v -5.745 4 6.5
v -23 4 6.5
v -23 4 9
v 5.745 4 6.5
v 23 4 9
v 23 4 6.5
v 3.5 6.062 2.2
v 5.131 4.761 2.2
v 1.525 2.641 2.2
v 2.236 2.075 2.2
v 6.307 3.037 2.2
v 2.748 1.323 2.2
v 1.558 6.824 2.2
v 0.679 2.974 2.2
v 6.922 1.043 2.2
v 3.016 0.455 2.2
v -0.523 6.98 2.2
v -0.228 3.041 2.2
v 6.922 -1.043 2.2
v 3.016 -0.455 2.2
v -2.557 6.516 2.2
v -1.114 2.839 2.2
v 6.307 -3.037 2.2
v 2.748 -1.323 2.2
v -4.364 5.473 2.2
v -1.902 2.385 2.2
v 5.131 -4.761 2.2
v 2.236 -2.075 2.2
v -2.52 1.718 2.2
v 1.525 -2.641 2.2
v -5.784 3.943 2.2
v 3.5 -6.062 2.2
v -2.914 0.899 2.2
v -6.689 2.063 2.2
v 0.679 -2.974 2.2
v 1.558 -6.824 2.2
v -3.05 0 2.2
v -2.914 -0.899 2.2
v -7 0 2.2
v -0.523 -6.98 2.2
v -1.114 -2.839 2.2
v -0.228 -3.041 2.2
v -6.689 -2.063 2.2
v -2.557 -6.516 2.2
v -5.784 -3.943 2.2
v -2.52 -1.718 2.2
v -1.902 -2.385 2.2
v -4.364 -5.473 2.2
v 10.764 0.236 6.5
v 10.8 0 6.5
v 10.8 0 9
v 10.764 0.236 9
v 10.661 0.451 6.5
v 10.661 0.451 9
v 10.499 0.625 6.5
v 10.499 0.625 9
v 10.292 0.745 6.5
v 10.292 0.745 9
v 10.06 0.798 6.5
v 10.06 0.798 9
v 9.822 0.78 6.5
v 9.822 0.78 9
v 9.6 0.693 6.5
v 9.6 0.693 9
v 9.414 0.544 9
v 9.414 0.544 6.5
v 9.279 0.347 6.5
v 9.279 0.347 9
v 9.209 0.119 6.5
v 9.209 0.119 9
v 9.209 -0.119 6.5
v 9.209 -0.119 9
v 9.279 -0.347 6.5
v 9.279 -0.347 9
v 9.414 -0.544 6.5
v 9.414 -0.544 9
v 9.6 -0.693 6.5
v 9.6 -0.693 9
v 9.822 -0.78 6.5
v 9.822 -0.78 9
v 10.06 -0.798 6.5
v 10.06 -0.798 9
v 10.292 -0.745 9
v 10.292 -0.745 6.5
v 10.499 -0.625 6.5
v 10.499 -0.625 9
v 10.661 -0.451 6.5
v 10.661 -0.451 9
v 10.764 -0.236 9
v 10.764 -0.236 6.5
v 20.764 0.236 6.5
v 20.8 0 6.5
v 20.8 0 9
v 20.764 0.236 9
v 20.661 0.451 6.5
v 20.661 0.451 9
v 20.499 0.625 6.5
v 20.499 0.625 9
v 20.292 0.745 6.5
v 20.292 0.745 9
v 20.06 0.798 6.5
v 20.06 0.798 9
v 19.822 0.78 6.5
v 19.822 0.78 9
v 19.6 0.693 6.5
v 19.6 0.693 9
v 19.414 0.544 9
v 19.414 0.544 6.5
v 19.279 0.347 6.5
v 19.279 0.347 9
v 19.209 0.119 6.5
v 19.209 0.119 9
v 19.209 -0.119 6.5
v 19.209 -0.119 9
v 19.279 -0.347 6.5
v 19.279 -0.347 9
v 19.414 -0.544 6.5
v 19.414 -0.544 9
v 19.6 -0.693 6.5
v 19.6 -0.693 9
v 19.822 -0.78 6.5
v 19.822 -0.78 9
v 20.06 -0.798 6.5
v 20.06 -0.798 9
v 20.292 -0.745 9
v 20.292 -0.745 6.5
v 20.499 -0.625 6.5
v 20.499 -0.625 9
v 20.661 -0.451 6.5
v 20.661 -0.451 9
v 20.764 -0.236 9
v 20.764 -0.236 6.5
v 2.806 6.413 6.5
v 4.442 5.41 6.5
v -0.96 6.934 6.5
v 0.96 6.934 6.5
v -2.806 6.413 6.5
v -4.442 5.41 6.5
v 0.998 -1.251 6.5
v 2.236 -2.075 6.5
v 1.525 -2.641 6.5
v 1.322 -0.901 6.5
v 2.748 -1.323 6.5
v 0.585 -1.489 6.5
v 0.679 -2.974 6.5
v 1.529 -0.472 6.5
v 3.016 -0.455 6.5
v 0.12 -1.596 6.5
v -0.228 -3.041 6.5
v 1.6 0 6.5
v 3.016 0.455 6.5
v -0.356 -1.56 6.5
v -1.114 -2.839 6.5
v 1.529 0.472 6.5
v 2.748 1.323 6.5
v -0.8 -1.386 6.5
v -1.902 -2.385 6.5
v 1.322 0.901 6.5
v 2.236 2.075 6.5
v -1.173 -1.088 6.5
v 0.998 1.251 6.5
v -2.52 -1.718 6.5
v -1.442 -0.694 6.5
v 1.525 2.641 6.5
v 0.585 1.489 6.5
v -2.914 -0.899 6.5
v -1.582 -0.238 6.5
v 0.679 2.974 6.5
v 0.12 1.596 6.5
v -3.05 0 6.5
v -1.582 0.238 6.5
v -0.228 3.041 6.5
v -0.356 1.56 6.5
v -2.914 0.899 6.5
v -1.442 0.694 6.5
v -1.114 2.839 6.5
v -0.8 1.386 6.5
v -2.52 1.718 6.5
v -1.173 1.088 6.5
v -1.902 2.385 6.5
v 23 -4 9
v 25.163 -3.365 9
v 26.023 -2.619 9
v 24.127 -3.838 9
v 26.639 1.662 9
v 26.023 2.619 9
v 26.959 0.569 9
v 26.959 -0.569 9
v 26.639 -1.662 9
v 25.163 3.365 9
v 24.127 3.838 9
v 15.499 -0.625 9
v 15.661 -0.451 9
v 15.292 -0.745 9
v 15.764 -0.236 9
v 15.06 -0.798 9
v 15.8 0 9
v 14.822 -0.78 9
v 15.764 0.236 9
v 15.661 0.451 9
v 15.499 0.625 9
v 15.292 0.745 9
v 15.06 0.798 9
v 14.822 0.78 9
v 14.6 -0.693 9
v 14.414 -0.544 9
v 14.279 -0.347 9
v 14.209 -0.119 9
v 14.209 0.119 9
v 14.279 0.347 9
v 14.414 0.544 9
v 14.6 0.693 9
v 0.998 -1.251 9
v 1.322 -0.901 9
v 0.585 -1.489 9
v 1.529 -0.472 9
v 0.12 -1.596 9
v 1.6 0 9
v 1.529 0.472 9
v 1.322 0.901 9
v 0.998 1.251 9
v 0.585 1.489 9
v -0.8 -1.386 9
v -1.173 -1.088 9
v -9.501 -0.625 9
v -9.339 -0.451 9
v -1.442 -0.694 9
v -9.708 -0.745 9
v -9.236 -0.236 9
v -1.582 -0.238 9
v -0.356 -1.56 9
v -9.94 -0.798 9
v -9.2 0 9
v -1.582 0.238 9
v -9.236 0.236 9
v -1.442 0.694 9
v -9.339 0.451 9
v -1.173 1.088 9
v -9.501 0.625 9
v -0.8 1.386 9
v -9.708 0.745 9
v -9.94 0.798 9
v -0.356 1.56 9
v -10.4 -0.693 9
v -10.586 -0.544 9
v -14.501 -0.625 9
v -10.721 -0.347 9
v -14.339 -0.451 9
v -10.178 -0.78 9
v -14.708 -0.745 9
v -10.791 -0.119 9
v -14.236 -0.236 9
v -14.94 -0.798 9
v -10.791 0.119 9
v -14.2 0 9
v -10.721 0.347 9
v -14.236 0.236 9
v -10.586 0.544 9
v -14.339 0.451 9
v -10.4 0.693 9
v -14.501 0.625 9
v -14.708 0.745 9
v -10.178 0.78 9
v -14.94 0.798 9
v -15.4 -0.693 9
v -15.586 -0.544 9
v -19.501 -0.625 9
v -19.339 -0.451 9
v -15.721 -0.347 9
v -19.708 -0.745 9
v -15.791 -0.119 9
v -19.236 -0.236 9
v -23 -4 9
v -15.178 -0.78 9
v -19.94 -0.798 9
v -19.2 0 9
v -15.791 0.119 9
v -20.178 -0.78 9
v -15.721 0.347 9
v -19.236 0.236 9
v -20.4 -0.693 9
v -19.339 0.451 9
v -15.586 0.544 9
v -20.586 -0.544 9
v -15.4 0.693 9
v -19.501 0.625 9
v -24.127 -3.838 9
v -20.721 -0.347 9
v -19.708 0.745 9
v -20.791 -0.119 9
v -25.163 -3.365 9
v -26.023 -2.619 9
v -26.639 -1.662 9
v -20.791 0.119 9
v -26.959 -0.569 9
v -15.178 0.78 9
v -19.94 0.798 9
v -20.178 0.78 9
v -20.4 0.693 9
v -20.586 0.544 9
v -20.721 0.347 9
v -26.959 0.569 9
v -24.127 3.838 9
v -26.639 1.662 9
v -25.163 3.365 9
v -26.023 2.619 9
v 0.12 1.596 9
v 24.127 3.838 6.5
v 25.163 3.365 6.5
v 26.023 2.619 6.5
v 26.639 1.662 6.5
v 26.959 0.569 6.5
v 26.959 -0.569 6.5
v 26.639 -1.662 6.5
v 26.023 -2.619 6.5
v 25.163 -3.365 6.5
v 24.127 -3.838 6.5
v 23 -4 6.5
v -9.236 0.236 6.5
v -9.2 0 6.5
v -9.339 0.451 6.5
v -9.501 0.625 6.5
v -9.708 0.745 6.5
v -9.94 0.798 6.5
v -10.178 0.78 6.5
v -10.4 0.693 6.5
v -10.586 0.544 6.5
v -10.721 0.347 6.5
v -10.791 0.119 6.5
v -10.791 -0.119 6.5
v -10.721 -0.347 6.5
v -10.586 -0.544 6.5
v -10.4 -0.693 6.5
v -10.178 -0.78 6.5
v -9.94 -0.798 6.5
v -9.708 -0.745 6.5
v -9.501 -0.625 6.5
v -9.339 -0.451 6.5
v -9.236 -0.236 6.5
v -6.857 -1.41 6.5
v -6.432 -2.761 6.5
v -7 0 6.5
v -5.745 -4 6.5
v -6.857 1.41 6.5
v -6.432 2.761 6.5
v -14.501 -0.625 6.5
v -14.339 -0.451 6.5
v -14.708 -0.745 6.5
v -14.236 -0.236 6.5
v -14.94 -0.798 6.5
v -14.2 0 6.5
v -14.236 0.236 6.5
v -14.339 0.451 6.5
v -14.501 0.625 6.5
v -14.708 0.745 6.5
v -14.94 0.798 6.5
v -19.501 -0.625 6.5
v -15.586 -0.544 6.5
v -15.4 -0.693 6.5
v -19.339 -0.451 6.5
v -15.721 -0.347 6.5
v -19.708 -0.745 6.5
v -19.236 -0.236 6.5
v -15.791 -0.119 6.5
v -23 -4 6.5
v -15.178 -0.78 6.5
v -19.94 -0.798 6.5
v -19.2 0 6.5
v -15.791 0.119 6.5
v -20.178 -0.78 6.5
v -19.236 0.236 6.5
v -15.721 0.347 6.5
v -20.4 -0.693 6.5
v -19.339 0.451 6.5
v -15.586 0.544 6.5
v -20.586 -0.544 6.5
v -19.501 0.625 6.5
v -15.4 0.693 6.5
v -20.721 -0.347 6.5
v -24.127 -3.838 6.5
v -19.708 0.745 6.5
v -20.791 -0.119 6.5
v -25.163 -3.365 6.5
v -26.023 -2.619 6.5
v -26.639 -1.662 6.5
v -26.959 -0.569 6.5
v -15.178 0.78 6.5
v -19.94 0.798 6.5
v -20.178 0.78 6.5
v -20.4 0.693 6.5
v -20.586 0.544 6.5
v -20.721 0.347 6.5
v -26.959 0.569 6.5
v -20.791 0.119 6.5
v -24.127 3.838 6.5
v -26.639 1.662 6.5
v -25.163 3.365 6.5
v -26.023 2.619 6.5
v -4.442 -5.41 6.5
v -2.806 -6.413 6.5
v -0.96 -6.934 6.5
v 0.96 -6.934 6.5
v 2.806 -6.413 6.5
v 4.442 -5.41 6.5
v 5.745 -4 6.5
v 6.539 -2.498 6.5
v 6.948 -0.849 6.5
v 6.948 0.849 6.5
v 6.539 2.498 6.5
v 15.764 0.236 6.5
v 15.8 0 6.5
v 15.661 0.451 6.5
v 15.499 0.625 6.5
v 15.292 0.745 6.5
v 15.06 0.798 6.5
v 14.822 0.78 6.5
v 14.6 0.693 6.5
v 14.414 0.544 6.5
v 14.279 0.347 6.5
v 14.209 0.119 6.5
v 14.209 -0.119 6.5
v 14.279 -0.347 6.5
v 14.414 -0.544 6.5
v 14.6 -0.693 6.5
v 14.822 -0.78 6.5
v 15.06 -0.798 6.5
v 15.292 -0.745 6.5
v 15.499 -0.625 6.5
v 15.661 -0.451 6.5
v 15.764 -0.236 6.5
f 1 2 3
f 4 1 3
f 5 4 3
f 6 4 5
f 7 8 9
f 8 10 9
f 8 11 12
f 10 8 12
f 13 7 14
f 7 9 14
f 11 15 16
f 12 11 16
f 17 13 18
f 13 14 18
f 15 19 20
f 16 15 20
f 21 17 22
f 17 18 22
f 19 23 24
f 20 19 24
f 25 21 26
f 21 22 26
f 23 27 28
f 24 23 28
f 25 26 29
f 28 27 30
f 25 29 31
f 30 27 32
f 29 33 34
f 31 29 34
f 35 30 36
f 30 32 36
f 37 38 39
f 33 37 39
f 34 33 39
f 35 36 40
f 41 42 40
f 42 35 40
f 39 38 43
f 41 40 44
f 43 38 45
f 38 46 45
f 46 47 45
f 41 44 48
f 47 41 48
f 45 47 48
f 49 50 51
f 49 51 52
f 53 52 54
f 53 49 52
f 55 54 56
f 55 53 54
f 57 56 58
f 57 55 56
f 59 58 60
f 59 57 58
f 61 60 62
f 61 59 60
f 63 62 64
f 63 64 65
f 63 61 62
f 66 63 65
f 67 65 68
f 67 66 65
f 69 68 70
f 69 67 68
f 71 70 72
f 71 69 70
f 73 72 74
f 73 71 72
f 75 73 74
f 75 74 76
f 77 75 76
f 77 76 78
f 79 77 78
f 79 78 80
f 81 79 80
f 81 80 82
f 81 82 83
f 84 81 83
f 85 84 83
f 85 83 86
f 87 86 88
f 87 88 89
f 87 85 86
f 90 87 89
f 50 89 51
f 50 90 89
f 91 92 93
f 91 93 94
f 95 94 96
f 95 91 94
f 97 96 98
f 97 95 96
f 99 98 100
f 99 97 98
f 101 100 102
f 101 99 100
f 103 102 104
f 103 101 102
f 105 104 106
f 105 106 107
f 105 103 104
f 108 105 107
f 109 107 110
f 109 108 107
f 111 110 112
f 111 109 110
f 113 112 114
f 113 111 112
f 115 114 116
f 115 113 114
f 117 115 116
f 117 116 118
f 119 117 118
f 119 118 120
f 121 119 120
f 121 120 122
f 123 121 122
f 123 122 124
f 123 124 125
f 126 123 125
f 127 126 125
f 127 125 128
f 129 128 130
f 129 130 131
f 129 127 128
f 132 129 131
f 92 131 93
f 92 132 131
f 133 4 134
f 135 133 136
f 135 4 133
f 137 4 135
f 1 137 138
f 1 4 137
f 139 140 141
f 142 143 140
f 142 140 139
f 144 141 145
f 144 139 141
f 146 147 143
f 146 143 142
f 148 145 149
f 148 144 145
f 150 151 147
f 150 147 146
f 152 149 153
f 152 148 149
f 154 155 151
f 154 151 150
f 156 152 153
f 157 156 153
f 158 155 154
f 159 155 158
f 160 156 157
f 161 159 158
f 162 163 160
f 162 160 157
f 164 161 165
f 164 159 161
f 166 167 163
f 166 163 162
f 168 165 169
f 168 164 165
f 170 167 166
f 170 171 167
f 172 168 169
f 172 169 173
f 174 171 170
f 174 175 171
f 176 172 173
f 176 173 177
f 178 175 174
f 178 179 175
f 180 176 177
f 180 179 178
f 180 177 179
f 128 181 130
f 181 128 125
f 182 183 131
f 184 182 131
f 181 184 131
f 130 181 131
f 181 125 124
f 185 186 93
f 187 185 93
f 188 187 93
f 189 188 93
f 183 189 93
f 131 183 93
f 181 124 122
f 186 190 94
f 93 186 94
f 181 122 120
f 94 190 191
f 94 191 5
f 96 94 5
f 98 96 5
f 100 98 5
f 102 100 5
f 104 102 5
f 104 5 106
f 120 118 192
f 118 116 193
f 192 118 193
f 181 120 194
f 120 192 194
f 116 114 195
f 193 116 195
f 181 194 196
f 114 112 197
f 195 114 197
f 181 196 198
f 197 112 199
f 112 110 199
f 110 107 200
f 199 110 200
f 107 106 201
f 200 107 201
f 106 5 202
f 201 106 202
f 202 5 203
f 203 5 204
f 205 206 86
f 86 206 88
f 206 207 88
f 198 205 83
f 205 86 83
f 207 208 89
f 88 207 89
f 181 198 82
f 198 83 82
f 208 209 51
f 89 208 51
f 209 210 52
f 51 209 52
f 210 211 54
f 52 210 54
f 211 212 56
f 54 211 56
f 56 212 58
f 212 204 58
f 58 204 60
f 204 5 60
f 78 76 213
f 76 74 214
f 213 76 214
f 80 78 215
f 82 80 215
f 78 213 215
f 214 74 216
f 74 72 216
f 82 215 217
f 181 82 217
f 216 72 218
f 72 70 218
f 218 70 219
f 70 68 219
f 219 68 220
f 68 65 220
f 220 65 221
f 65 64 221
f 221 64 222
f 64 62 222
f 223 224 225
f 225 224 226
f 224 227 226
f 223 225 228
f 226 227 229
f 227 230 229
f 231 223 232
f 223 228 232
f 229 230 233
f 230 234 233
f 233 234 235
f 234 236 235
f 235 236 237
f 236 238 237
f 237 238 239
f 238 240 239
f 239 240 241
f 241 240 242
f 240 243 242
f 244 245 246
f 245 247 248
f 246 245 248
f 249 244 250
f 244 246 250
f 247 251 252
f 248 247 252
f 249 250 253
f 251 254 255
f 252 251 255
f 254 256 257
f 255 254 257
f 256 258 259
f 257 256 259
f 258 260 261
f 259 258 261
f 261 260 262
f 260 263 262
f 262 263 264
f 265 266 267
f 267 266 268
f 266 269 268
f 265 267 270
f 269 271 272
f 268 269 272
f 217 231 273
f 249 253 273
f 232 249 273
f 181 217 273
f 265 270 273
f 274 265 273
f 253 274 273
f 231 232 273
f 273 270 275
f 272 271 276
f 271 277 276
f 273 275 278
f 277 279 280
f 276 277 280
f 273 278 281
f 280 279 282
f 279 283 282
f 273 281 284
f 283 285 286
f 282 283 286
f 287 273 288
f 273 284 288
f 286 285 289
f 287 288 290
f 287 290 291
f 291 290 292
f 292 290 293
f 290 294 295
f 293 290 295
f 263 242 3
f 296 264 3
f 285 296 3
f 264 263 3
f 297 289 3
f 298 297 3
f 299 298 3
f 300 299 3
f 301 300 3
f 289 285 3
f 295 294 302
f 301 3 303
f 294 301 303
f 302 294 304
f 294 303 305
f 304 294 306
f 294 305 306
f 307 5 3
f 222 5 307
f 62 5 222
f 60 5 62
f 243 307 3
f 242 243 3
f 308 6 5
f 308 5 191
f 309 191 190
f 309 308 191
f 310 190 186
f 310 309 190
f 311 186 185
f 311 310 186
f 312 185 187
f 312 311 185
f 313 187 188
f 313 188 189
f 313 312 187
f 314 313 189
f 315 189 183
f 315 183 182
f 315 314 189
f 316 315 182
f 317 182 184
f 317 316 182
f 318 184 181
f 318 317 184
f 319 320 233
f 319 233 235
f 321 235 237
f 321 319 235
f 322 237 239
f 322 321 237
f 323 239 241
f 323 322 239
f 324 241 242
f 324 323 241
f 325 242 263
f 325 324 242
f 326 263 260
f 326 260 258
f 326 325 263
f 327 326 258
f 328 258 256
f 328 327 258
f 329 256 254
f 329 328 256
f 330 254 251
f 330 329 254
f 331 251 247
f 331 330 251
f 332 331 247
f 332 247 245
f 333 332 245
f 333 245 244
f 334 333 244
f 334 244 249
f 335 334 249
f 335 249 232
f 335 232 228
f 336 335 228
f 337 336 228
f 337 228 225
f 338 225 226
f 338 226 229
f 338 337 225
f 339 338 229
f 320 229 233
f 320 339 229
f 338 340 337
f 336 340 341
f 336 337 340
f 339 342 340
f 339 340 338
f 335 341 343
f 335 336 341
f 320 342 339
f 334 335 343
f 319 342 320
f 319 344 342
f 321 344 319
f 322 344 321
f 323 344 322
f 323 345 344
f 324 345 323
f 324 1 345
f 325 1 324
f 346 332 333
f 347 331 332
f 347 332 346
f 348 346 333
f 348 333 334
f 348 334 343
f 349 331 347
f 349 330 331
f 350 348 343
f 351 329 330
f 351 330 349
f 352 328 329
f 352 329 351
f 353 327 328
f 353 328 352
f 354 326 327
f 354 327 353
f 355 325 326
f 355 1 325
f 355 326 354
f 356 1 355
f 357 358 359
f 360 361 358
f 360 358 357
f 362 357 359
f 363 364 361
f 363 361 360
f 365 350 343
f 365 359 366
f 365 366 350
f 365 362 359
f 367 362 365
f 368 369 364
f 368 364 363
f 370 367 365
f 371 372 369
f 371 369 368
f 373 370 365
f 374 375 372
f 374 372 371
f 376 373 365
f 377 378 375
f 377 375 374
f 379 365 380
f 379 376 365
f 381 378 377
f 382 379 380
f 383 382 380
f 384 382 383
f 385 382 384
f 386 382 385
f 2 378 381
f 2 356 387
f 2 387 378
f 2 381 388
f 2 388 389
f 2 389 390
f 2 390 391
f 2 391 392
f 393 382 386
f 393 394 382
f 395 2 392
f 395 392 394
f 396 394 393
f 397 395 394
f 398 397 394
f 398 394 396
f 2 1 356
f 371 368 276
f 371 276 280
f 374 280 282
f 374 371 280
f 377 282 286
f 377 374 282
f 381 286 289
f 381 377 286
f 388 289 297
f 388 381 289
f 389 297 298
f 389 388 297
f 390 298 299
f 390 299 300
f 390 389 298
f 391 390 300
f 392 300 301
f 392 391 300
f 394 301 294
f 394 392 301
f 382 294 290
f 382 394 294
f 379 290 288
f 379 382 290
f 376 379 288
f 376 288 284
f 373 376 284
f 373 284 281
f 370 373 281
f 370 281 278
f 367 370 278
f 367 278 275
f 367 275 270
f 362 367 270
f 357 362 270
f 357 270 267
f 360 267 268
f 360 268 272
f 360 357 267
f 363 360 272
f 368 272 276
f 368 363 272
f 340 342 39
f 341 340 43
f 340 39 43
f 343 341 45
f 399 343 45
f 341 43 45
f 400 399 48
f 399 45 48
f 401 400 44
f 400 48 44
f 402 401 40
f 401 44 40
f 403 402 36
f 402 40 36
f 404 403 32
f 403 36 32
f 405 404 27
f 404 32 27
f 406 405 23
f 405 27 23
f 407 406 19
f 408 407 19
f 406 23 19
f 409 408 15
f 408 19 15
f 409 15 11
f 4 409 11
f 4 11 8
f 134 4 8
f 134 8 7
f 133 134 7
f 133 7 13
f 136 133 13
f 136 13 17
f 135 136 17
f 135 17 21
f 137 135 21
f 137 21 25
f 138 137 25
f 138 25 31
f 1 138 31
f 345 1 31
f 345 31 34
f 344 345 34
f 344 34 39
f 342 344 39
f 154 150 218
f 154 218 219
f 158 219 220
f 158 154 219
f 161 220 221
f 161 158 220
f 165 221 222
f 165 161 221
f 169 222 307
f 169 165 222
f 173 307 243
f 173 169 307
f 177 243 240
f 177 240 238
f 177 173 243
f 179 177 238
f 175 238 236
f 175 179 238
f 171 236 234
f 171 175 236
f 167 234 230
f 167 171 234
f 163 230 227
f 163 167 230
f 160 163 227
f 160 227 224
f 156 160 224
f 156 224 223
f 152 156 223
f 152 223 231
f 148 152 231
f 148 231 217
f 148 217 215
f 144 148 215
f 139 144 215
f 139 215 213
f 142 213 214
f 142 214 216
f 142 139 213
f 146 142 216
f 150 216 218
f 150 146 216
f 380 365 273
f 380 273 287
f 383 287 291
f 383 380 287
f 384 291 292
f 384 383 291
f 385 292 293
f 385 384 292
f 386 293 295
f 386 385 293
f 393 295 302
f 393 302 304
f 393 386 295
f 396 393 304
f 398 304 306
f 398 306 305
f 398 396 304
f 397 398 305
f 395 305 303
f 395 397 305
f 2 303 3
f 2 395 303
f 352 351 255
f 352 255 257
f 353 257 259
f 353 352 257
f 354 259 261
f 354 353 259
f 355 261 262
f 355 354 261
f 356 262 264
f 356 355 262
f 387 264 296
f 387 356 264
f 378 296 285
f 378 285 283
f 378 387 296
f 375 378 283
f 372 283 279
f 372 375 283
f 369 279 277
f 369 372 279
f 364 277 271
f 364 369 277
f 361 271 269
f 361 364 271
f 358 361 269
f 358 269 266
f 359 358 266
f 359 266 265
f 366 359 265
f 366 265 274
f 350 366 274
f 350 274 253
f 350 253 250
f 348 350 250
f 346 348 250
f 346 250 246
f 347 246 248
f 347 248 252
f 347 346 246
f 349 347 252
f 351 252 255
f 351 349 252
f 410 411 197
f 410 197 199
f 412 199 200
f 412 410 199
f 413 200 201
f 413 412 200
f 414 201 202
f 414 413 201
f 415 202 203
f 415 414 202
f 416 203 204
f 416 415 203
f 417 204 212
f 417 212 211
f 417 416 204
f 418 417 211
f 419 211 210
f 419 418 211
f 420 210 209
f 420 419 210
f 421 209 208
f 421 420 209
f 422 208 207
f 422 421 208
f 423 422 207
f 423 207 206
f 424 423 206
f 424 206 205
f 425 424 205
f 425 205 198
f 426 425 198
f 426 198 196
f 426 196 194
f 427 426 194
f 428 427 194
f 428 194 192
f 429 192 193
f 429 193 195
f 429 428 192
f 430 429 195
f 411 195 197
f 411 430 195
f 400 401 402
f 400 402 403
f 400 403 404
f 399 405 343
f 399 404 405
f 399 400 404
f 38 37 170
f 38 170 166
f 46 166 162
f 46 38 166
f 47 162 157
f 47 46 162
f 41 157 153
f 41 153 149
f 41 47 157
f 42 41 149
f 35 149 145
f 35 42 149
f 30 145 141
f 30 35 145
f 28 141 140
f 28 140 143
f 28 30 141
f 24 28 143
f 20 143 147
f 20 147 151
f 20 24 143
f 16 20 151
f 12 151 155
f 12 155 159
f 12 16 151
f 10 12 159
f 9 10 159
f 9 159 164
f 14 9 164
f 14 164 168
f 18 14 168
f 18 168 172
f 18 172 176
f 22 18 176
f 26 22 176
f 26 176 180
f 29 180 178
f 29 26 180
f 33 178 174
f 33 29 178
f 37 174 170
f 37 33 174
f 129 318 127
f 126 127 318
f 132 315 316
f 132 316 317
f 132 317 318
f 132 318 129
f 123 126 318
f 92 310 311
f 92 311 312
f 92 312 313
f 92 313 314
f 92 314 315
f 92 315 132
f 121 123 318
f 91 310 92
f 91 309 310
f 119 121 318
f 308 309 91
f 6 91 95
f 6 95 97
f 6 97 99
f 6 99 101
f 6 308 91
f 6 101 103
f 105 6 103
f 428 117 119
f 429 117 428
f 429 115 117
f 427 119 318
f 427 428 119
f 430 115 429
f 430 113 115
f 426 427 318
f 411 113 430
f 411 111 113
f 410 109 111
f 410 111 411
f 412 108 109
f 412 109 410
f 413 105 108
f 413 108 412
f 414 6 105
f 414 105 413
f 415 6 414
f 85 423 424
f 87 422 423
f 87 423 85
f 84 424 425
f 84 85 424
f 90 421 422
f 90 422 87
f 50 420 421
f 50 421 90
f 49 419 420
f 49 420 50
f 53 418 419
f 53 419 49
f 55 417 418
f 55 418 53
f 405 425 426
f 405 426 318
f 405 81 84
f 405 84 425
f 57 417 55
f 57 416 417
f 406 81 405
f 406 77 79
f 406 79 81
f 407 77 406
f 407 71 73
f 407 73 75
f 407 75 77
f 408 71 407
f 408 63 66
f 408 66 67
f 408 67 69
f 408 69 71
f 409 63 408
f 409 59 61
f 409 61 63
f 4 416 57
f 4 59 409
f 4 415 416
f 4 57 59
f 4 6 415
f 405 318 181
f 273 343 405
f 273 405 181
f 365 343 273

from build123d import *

# Parameters (mm, degrees)
HUB_START   = 2.2
SKETCH1_R   = 7
SKETCH1_R_2 = 3.05
HUB_DEPTH   = 4.3
ARM_START   = 6.5
SKETCH2_R   = 1.6
SKETCH2_R_2 = 0.8
ARM_DEPTH   = 2.5


with BuildPart() as part:
    # Sketch1 → Hub (new body)
    with BuildSketch(Plane.XY.offset(HUB_START)):
        with Locations(Location((0, 0, 0), (0, 0, 180))):
            Circle(SKETCH1_R)
        with Locations(Location((0, 0, 0), (0, 0, 180))):
            Circle(SKETCH1_R_2, mode=Mode.SUBTRACT)
    extrude(amount=HUB_DEPTH)

    # Sketch2 → Arm (add)
    with BuildSketch(Plane.XY.offset(ARM_START)):
        with BuildLine():
            Line((-23, 4), (23, 4))
            ThreePointArc((23, 4), (27, 0), (23, -4))
            Line((23, -4), (-23, -4))
            ThreePointArc((-23, -4), (-27, 0), (-23, 4))
        make_face()
        Circle(SKETCH2_R, mode=Mode.SUBTRACT)
        with Locations((-10, 0)):
            Circle(SKETCH2_R_2, mode=Mode.SUBTRACT)
        with Locations((-15, 0)):
            Circle(SKETCH2_R_2, mode=Mode.SUBTRACT)
        with Locations((-20, 0)):
            Circle(SKETCH2_R_2, mode=Mode.SUBTRACT)
        with Locations((10, 0)):
            Circle(SKETCH2_R_2, mode=Mode.SUBTRACT)
        with Locations((15, 0)):
            Circle(SKETCH2_R_2, mode=Mode.SUBTRACT)
        with Locations((20, 0)):
            Circle(SKETCH2_R_2, mode=Mode.SUBTRACT)
    extrude(amount=ARM_DEPTH)


solid = part.part
